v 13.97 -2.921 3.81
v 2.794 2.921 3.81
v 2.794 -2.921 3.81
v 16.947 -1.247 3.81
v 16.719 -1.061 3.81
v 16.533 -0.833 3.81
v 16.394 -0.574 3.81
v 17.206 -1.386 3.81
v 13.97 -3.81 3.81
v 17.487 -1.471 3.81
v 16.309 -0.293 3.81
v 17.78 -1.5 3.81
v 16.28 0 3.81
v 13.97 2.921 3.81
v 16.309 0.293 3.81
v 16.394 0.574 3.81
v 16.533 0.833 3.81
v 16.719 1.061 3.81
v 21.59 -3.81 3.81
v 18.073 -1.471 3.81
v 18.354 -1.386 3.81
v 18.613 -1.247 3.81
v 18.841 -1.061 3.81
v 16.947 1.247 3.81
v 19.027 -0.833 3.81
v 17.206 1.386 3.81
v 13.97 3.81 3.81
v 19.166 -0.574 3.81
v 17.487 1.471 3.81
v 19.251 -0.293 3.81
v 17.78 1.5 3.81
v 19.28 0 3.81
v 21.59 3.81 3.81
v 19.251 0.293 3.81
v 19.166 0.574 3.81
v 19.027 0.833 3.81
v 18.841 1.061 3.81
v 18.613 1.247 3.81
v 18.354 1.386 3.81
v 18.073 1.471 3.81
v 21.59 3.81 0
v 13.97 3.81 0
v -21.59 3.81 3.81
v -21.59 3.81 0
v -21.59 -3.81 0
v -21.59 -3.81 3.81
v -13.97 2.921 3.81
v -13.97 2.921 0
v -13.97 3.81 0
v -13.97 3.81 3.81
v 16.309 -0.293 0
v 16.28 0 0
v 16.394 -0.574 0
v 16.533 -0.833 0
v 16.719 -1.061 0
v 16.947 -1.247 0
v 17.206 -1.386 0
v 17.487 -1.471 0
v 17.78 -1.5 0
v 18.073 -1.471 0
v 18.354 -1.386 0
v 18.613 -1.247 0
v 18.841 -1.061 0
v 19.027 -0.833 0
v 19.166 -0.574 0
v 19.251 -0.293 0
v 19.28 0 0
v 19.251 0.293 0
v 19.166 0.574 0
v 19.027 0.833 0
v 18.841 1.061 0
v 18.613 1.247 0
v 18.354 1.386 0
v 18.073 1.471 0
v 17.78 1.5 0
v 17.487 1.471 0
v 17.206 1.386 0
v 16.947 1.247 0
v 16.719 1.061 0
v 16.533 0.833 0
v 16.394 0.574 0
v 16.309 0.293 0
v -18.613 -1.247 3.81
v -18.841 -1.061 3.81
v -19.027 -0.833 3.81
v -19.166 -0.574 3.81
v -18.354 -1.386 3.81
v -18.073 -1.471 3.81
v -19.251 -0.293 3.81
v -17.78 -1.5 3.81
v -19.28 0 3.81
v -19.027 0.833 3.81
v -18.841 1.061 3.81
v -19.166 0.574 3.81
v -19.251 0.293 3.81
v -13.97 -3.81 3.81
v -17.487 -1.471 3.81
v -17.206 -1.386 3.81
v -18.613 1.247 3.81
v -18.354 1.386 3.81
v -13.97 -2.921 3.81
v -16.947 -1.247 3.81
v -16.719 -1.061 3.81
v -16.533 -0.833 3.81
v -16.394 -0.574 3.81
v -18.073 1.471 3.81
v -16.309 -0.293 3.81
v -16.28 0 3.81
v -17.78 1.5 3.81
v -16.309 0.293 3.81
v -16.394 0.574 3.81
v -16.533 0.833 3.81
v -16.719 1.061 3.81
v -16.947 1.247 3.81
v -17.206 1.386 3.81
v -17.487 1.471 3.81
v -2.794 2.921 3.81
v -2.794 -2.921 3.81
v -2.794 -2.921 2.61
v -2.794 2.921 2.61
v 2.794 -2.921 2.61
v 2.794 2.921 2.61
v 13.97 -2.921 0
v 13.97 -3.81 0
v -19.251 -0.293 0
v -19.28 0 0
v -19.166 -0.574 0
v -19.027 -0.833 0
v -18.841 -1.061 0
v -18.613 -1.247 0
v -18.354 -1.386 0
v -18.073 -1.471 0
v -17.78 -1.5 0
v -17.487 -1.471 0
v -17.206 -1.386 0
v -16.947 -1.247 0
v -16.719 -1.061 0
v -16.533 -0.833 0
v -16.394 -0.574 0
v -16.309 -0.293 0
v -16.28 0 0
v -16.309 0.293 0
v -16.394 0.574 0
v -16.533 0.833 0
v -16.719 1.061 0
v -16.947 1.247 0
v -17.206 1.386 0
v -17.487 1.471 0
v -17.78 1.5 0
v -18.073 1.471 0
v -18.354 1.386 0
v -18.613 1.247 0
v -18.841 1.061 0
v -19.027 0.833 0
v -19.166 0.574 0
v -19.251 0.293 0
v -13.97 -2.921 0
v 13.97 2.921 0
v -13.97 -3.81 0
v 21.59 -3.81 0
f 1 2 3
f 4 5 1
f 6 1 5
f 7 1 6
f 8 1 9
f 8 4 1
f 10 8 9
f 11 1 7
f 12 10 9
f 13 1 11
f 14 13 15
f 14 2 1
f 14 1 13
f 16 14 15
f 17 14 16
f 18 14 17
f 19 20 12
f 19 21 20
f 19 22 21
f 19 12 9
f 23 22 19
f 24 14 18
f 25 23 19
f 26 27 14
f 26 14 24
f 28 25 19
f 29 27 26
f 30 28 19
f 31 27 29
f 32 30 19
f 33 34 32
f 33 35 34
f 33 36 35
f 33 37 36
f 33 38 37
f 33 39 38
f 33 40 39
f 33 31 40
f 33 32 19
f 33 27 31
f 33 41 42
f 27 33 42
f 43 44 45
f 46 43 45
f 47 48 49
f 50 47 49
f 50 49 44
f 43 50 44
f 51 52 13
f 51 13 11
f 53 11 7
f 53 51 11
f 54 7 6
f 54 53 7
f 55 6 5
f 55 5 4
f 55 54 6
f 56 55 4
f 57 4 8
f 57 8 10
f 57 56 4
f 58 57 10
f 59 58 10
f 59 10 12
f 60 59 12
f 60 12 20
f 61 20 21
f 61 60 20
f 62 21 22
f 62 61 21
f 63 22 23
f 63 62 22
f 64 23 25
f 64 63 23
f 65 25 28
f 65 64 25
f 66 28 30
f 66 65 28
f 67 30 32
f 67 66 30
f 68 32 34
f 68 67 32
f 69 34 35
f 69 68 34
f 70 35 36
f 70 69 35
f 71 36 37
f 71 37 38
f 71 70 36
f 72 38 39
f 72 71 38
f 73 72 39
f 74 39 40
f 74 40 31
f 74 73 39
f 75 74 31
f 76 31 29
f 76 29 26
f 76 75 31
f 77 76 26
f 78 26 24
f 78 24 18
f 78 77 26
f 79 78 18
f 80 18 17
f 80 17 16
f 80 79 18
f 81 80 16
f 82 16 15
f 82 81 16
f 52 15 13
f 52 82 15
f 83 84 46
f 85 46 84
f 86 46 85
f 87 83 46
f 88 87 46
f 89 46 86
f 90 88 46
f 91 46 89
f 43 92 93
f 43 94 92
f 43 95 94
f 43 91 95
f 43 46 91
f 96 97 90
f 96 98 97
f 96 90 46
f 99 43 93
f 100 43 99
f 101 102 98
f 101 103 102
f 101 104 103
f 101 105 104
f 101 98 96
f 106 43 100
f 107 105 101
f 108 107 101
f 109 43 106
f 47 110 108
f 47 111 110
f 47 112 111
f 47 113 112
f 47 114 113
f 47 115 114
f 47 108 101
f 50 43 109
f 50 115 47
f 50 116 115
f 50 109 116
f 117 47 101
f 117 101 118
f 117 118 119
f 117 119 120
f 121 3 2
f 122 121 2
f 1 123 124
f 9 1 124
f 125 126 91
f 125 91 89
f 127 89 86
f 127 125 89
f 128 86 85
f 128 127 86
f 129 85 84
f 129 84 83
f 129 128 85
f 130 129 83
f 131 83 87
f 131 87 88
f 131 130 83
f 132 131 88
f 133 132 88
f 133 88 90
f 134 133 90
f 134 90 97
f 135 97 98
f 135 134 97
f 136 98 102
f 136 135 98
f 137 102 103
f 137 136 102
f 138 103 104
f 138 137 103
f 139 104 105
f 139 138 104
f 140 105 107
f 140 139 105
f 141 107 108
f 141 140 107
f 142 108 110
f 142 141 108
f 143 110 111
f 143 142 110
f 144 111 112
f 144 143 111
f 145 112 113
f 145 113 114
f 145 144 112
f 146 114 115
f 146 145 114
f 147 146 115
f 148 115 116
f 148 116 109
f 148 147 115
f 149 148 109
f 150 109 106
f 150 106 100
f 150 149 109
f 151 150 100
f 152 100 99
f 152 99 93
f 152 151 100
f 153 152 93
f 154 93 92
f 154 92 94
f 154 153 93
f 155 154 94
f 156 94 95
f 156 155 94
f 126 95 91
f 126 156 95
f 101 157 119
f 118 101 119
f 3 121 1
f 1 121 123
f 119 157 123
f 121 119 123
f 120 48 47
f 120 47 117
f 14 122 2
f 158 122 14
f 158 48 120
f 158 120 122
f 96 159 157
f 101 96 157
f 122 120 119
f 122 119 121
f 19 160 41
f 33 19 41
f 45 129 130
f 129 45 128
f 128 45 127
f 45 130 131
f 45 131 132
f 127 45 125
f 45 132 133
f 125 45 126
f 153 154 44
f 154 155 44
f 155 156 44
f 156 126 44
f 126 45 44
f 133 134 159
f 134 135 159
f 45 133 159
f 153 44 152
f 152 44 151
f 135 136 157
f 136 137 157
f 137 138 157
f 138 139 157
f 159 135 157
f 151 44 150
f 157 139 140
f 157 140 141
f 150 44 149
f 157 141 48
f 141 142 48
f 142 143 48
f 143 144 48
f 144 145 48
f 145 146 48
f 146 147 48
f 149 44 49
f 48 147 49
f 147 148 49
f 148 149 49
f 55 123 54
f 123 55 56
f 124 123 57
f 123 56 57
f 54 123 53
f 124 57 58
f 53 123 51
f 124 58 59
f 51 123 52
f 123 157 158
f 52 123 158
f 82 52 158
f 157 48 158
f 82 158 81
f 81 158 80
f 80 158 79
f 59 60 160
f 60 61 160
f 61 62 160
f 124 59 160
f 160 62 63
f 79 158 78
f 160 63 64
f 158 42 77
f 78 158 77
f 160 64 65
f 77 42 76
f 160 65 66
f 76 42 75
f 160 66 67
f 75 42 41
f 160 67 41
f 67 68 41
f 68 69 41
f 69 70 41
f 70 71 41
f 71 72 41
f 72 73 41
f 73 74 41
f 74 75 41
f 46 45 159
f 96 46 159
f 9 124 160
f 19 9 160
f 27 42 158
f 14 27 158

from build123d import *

# Parameters (mm, degrees)
SKETCH1_R           = 1.5
SKETCH1_W           = 27.94
SKETCH1_H           = 5.842
BOSS_EXTRUDE1_DEPTH = 3.81
SKETCH2_W           = 5.588
SKETCH2_H           = 5.842
CUT_EXTRUDE1_DEPTH  = 1.2


with BuildPart() as part:
    # Sketch1 → Boss-Extrude1 (new body)
    # profile 1 of 3: a face of its own
    with BuildSketch(Plane.XY):
        Polygon((-13.97, -3.81), (-13.97, -2.921), (-13.97, 2.921), (-13.97, 3.81), (-21.59, 3.81), (-21.59, -3.81), align=None)
        with Locations(Location((-17.78, 0, 0), (0, 0, 180))):
            Circle(SKETCH1_R, mode=Mode.SUBTRACT)
    # profile 2 of 3: a face of its own
    with BuildSketch(Plane.XY):
        Rectangle(SKETCH1_W, SKETCH1_H)
    # profile 3 of 3: a face of its own
    with BuildSketch(Plane.XY):
        Polygon((13.97, 2.921), (13.97, -2.921), (13.97, -3.81), (21.59, -3.81), (21.59, 3.81), (13.97, 3.81), align=None)
        with Locations(Location((17.78, 0, 0), (0, 0, 180))):
            Circle(SKETCH1_R, mode=Mode.SUBTRACT)
    extrude(amount=BOSS_EXTRUDE1_DEPTH)

    # Sketch2 → Cut-Extrude1 (cut)
    with BuildSketch(Plane.XY.offset(3.81)):
        Rectangle(SKETCH2_W, SKETCH2_H)
    extrude(amount=-CUT_EXTRUDE1_DEPTH, mode=Mode.SUBTRACT)


solid = part.part
